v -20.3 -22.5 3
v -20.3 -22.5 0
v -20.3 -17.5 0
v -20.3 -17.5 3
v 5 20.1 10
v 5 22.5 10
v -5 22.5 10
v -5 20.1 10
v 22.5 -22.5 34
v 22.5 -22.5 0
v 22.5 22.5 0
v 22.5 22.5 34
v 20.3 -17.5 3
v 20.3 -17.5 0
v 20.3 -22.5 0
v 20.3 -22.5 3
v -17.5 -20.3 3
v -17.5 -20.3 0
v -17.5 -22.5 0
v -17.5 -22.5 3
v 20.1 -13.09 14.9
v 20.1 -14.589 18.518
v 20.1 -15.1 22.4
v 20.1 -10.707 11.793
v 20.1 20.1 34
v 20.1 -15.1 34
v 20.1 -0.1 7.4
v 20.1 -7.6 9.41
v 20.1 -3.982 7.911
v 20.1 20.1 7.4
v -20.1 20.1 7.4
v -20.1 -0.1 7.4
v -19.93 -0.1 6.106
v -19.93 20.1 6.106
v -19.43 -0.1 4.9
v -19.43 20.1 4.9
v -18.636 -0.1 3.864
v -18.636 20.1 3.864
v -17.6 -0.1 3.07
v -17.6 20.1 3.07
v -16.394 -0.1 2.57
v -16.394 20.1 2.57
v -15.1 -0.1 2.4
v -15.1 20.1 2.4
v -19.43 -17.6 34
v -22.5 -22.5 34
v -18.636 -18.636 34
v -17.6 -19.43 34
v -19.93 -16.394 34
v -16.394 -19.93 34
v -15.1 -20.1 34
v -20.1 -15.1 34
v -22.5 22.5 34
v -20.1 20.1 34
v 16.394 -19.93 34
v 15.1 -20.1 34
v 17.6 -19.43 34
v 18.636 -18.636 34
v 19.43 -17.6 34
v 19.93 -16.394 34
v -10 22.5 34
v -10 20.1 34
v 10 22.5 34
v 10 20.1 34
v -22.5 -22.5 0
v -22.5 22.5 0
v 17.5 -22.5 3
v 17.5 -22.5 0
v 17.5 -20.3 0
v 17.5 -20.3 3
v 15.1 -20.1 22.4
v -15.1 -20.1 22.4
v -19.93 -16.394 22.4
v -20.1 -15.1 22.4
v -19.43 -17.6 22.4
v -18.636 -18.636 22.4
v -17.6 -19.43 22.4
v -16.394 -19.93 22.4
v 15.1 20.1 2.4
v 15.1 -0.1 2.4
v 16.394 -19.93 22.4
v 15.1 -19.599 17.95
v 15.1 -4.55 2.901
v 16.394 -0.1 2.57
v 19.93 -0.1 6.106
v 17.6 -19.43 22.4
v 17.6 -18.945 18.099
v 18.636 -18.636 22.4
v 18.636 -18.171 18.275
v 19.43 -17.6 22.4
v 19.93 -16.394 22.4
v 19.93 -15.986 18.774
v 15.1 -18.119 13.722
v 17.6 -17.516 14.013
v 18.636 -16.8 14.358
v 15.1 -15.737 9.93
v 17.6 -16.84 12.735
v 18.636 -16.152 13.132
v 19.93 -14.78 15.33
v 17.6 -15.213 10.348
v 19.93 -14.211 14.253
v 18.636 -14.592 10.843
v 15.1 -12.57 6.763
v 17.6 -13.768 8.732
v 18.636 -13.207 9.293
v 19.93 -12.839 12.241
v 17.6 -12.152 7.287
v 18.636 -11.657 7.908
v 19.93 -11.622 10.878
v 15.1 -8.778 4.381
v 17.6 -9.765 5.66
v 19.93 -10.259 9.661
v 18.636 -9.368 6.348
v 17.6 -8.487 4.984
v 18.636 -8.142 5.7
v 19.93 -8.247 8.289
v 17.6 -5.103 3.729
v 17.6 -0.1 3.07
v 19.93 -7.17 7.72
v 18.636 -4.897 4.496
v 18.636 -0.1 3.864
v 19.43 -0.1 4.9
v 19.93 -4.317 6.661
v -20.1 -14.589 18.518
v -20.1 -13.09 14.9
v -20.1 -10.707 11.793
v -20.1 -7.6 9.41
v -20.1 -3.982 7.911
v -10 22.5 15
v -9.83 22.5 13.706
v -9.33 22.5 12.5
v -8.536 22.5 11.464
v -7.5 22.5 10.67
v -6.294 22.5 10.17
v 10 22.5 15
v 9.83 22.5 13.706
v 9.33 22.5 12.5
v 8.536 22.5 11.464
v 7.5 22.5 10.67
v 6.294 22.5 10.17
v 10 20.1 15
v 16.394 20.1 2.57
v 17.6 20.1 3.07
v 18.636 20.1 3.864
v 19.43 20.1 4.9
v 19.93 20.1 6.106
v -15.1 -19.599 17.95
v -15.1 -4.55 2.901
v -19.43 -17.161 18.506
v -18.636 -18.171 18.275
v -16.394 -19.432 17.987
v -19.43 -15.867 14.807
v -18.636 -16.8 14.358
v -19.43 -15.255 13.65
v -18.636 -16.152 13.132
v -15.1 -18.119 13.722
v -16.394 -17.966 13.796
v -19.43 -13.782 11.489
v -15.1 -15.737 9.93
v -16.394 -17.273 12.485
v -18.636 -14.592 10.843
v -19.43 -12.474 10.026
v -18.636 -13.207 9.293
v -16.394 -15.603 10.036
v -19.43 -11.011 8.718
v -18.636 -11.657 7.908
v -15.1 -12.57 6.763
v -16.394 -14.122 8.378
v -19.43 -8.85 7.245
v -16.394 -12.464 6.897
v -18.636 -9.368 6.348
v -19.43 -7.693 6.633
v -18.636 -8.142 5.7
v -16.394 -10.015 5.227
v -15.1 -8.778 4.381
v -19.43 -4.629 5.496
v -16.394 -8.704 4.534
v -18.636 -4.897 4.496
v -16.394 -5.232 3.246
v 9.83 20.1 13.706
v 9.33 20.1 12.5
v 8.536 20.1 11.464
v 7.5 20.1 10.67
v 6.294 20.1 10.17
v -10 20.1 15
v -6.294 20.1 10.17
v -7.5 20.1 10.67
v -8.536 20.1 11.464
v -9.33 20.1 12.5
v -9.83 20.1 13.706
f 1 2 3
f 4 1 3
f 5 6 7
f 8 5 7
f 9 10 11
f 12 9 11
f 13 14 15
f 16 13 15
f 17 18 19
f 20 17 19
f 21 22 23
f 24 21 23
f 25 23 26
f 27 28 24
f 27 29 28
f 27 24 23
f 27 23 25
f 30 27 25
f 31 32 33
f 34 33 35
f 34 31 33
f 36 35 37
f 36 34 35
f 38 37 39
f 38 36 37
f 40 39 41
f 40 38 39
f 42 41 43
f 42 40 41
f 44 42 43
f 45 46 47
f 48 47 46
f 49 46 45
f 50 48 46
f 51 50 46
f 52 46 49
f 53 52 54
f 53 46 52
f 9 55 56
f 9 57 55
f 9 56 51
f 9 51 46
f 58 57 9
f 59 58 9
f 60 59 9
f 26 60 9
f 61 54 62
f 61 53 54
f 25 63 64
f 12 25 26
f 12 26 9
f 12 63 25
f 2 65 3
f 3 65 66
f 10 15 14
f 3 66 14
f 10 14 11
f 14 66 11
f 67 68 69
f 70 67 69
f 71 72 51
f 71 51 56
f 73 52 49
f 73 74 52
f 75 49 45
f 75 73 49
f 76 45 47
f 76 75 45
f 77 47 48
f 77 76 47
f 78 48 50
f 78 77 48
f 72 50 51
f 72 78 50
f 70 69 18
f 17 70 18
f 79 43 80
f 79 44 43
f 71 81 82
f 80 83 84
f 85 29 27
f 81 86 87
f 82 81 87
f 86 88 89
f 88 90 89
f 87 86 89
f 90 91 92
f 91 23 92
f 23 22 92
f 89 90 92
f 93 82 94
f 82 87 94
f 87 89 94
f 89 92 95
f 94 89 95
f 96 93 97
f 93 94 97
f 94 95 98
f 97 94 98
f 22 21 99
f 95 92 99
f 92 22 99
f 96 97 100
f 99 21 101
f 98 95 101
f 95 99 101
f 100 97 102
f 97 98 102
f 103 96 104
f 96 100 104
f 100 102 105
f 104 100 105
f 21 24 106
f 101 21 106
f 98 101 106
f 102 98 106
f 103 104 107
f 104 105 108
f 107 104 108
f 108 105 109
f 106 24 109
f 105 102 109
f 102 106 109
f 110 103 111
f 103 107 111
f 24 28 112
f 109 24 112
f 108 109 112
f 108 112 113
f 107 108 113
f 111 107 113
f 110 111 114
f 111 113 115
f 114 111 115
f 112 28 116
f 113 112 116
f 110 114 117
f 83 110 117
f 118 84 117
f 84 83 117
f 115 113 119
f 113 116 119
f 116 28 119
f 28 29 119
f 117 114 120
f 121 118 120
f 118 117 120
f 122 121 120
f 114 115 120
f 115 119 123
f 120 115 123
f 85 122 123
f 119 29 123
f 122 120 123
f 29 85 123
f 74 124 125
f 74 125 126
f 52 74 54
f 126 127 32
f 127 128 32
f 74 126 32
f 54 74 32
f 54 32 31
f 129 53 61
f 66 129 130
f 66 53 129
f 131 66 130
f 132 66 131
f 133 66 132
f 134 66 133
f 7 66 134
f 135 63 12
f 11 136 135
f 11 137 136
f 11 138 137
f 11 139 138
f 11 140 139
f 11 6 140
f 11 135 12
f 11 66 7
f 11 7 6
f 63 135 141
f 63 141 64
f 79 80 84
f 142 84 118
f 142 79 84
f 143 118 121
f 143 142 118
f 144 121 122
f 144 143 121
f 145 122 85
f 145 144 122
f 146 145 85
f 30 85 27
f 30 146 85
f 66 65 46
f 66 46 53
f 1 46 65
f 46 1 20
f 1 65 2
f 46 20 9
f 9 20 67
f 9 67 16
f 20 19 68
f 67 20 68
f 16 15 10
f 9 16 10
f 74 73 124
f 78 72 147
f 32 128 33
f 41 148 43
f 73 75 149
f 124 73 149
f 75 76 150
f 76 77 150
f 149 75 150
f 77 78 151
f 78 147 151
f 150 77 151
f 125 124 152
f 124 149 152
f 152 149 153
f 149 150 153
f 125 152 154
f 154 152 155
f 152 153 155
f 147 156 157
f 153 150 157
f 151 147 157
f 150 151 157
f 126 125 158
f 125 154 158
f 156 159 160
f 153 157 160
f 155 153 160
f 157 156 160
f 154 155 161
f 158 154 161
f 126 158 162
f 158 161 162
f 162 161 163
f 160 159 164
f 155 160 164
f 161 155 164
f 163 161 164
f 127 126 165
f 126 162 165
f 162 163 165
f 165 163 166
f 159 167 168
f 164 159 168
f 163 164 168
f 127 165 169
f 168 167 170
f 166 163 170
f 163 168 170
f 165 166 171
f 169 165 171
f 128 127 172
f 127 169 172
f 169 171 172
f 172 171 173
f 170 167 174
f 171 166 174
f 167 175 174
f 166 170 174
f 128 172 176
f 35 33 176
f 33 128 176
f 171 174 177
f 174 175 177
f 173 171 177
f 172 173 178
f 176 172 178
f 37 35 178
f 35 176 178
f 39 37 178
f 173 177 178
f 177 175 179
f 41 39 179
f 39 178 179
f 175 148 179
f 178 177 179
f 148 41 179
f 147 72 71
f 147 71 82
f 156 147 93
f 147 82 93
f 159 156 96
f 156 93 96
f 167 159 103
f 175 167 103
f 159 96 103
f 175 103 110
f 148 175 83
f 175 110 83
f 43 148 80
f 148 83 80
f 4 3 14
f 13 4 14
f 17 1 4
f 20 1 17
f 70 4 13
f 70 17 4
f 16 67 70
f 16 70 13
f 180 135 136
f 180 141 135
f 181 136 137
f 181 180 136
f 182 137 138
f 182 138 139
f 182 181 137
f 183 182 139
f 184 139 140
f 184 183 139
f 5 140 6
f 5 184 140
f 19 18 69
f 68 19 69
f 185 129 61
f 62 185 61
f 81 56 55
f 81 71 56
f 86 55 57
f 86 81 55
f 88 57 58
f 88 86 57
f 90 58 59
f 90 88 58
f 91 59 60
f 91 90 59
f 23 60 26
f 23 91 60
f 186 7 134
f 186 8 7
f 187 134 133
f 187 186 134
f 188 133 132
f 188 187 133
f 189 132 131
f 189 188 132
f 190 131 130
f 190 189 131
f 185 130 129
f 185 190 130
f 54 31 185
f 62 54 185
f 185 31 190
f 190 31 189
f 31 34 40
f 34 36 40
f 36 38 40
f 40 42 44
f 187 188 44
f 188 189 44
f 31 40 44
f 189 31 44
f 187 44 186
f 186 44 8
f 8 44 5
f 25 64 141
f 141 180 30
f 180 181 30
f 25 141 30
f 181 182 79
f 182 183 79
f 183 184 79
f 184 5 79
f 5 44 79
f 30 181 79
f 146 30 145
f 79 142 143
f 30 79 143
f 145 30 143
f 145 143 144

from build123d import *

# Parameters (mm, degrees)
F0_W     = 45
F0_H     = 45
F1_DEPTH = 34
F2_T     = -2.4
F3_R     = 20
F4_R     = 5
F5_W     = 20
F5_H     = 24
F6_DEPTH = 5
F7_R     = 5
F9_DEPTH = 3


with BuildPart() as f1:
    # F0 (on Top) → F1 (new body)
    with BuildSketch(Plane.XY):
        Rectangle(F0_W, F0_H)
    extrude(amount=F1_DEPTH)

    # F2
    f2_openings = [f1.faces().sort_by_distance(p)[0] for p in [
        (0, 0, 34),
    ]]
    offset(amount=F2_T, openings=f2_openings)

    # F3
    f3_edges = [f1.edges().sort_by_distance(p)[0] for p in [
        (0, -20.1, 2.4),
    ]]
    fillet(f3_edges, radius=F3_R)

    # F4
    f4_edges = [f1.edges().sort_by_distance(p)[0] for p in [
        (-20.1, 10, 2.4),
        (20.1, 10, 2.4),
    ]]
    fillet(f4_edges, radius=F4_R)

    # F5 (on face) → F6 (cut)
    with BuildSketch(Plane(origin=(0, 22.5, 0), x_dir=(-1, 0, 0), z_dir=(0, 1, 0))):
        with Locations((0, 22)):
            Rectangle(F5_W, F5_H)
    extrude(amount=-F6_DEPTH, mode=Mode.SUBTRACT)

    # F7
    f7_edges = [f1.edges().sort_by_distance(p)[0] for p in [
        (10, 21.3, 10),
        (-10, 21.3, 10),
    ]]
    fillet(f7_edges, radius=F7_R)

    # F8 (on face) → F9 (cut)
    with BuildSketch(Plane(origin=(0, 0, 0), x_dir=(1, 0, 0), z_dir=(0, 0, -1))):
        Polygon((-17.5, 22.5), (-20.3, 22.5), (-20.3, 20), (-20.3, 17.5), (20.3, 17.5), (20.3, 20), (20.3, 22.5), (17.5, 22.5), (17.5, 20.3), (-17.5, 20.3), align=None)
    extrude(amount=-F9_DEPTH, mode=Mode.SUBTRACT)


solid = f1.part
